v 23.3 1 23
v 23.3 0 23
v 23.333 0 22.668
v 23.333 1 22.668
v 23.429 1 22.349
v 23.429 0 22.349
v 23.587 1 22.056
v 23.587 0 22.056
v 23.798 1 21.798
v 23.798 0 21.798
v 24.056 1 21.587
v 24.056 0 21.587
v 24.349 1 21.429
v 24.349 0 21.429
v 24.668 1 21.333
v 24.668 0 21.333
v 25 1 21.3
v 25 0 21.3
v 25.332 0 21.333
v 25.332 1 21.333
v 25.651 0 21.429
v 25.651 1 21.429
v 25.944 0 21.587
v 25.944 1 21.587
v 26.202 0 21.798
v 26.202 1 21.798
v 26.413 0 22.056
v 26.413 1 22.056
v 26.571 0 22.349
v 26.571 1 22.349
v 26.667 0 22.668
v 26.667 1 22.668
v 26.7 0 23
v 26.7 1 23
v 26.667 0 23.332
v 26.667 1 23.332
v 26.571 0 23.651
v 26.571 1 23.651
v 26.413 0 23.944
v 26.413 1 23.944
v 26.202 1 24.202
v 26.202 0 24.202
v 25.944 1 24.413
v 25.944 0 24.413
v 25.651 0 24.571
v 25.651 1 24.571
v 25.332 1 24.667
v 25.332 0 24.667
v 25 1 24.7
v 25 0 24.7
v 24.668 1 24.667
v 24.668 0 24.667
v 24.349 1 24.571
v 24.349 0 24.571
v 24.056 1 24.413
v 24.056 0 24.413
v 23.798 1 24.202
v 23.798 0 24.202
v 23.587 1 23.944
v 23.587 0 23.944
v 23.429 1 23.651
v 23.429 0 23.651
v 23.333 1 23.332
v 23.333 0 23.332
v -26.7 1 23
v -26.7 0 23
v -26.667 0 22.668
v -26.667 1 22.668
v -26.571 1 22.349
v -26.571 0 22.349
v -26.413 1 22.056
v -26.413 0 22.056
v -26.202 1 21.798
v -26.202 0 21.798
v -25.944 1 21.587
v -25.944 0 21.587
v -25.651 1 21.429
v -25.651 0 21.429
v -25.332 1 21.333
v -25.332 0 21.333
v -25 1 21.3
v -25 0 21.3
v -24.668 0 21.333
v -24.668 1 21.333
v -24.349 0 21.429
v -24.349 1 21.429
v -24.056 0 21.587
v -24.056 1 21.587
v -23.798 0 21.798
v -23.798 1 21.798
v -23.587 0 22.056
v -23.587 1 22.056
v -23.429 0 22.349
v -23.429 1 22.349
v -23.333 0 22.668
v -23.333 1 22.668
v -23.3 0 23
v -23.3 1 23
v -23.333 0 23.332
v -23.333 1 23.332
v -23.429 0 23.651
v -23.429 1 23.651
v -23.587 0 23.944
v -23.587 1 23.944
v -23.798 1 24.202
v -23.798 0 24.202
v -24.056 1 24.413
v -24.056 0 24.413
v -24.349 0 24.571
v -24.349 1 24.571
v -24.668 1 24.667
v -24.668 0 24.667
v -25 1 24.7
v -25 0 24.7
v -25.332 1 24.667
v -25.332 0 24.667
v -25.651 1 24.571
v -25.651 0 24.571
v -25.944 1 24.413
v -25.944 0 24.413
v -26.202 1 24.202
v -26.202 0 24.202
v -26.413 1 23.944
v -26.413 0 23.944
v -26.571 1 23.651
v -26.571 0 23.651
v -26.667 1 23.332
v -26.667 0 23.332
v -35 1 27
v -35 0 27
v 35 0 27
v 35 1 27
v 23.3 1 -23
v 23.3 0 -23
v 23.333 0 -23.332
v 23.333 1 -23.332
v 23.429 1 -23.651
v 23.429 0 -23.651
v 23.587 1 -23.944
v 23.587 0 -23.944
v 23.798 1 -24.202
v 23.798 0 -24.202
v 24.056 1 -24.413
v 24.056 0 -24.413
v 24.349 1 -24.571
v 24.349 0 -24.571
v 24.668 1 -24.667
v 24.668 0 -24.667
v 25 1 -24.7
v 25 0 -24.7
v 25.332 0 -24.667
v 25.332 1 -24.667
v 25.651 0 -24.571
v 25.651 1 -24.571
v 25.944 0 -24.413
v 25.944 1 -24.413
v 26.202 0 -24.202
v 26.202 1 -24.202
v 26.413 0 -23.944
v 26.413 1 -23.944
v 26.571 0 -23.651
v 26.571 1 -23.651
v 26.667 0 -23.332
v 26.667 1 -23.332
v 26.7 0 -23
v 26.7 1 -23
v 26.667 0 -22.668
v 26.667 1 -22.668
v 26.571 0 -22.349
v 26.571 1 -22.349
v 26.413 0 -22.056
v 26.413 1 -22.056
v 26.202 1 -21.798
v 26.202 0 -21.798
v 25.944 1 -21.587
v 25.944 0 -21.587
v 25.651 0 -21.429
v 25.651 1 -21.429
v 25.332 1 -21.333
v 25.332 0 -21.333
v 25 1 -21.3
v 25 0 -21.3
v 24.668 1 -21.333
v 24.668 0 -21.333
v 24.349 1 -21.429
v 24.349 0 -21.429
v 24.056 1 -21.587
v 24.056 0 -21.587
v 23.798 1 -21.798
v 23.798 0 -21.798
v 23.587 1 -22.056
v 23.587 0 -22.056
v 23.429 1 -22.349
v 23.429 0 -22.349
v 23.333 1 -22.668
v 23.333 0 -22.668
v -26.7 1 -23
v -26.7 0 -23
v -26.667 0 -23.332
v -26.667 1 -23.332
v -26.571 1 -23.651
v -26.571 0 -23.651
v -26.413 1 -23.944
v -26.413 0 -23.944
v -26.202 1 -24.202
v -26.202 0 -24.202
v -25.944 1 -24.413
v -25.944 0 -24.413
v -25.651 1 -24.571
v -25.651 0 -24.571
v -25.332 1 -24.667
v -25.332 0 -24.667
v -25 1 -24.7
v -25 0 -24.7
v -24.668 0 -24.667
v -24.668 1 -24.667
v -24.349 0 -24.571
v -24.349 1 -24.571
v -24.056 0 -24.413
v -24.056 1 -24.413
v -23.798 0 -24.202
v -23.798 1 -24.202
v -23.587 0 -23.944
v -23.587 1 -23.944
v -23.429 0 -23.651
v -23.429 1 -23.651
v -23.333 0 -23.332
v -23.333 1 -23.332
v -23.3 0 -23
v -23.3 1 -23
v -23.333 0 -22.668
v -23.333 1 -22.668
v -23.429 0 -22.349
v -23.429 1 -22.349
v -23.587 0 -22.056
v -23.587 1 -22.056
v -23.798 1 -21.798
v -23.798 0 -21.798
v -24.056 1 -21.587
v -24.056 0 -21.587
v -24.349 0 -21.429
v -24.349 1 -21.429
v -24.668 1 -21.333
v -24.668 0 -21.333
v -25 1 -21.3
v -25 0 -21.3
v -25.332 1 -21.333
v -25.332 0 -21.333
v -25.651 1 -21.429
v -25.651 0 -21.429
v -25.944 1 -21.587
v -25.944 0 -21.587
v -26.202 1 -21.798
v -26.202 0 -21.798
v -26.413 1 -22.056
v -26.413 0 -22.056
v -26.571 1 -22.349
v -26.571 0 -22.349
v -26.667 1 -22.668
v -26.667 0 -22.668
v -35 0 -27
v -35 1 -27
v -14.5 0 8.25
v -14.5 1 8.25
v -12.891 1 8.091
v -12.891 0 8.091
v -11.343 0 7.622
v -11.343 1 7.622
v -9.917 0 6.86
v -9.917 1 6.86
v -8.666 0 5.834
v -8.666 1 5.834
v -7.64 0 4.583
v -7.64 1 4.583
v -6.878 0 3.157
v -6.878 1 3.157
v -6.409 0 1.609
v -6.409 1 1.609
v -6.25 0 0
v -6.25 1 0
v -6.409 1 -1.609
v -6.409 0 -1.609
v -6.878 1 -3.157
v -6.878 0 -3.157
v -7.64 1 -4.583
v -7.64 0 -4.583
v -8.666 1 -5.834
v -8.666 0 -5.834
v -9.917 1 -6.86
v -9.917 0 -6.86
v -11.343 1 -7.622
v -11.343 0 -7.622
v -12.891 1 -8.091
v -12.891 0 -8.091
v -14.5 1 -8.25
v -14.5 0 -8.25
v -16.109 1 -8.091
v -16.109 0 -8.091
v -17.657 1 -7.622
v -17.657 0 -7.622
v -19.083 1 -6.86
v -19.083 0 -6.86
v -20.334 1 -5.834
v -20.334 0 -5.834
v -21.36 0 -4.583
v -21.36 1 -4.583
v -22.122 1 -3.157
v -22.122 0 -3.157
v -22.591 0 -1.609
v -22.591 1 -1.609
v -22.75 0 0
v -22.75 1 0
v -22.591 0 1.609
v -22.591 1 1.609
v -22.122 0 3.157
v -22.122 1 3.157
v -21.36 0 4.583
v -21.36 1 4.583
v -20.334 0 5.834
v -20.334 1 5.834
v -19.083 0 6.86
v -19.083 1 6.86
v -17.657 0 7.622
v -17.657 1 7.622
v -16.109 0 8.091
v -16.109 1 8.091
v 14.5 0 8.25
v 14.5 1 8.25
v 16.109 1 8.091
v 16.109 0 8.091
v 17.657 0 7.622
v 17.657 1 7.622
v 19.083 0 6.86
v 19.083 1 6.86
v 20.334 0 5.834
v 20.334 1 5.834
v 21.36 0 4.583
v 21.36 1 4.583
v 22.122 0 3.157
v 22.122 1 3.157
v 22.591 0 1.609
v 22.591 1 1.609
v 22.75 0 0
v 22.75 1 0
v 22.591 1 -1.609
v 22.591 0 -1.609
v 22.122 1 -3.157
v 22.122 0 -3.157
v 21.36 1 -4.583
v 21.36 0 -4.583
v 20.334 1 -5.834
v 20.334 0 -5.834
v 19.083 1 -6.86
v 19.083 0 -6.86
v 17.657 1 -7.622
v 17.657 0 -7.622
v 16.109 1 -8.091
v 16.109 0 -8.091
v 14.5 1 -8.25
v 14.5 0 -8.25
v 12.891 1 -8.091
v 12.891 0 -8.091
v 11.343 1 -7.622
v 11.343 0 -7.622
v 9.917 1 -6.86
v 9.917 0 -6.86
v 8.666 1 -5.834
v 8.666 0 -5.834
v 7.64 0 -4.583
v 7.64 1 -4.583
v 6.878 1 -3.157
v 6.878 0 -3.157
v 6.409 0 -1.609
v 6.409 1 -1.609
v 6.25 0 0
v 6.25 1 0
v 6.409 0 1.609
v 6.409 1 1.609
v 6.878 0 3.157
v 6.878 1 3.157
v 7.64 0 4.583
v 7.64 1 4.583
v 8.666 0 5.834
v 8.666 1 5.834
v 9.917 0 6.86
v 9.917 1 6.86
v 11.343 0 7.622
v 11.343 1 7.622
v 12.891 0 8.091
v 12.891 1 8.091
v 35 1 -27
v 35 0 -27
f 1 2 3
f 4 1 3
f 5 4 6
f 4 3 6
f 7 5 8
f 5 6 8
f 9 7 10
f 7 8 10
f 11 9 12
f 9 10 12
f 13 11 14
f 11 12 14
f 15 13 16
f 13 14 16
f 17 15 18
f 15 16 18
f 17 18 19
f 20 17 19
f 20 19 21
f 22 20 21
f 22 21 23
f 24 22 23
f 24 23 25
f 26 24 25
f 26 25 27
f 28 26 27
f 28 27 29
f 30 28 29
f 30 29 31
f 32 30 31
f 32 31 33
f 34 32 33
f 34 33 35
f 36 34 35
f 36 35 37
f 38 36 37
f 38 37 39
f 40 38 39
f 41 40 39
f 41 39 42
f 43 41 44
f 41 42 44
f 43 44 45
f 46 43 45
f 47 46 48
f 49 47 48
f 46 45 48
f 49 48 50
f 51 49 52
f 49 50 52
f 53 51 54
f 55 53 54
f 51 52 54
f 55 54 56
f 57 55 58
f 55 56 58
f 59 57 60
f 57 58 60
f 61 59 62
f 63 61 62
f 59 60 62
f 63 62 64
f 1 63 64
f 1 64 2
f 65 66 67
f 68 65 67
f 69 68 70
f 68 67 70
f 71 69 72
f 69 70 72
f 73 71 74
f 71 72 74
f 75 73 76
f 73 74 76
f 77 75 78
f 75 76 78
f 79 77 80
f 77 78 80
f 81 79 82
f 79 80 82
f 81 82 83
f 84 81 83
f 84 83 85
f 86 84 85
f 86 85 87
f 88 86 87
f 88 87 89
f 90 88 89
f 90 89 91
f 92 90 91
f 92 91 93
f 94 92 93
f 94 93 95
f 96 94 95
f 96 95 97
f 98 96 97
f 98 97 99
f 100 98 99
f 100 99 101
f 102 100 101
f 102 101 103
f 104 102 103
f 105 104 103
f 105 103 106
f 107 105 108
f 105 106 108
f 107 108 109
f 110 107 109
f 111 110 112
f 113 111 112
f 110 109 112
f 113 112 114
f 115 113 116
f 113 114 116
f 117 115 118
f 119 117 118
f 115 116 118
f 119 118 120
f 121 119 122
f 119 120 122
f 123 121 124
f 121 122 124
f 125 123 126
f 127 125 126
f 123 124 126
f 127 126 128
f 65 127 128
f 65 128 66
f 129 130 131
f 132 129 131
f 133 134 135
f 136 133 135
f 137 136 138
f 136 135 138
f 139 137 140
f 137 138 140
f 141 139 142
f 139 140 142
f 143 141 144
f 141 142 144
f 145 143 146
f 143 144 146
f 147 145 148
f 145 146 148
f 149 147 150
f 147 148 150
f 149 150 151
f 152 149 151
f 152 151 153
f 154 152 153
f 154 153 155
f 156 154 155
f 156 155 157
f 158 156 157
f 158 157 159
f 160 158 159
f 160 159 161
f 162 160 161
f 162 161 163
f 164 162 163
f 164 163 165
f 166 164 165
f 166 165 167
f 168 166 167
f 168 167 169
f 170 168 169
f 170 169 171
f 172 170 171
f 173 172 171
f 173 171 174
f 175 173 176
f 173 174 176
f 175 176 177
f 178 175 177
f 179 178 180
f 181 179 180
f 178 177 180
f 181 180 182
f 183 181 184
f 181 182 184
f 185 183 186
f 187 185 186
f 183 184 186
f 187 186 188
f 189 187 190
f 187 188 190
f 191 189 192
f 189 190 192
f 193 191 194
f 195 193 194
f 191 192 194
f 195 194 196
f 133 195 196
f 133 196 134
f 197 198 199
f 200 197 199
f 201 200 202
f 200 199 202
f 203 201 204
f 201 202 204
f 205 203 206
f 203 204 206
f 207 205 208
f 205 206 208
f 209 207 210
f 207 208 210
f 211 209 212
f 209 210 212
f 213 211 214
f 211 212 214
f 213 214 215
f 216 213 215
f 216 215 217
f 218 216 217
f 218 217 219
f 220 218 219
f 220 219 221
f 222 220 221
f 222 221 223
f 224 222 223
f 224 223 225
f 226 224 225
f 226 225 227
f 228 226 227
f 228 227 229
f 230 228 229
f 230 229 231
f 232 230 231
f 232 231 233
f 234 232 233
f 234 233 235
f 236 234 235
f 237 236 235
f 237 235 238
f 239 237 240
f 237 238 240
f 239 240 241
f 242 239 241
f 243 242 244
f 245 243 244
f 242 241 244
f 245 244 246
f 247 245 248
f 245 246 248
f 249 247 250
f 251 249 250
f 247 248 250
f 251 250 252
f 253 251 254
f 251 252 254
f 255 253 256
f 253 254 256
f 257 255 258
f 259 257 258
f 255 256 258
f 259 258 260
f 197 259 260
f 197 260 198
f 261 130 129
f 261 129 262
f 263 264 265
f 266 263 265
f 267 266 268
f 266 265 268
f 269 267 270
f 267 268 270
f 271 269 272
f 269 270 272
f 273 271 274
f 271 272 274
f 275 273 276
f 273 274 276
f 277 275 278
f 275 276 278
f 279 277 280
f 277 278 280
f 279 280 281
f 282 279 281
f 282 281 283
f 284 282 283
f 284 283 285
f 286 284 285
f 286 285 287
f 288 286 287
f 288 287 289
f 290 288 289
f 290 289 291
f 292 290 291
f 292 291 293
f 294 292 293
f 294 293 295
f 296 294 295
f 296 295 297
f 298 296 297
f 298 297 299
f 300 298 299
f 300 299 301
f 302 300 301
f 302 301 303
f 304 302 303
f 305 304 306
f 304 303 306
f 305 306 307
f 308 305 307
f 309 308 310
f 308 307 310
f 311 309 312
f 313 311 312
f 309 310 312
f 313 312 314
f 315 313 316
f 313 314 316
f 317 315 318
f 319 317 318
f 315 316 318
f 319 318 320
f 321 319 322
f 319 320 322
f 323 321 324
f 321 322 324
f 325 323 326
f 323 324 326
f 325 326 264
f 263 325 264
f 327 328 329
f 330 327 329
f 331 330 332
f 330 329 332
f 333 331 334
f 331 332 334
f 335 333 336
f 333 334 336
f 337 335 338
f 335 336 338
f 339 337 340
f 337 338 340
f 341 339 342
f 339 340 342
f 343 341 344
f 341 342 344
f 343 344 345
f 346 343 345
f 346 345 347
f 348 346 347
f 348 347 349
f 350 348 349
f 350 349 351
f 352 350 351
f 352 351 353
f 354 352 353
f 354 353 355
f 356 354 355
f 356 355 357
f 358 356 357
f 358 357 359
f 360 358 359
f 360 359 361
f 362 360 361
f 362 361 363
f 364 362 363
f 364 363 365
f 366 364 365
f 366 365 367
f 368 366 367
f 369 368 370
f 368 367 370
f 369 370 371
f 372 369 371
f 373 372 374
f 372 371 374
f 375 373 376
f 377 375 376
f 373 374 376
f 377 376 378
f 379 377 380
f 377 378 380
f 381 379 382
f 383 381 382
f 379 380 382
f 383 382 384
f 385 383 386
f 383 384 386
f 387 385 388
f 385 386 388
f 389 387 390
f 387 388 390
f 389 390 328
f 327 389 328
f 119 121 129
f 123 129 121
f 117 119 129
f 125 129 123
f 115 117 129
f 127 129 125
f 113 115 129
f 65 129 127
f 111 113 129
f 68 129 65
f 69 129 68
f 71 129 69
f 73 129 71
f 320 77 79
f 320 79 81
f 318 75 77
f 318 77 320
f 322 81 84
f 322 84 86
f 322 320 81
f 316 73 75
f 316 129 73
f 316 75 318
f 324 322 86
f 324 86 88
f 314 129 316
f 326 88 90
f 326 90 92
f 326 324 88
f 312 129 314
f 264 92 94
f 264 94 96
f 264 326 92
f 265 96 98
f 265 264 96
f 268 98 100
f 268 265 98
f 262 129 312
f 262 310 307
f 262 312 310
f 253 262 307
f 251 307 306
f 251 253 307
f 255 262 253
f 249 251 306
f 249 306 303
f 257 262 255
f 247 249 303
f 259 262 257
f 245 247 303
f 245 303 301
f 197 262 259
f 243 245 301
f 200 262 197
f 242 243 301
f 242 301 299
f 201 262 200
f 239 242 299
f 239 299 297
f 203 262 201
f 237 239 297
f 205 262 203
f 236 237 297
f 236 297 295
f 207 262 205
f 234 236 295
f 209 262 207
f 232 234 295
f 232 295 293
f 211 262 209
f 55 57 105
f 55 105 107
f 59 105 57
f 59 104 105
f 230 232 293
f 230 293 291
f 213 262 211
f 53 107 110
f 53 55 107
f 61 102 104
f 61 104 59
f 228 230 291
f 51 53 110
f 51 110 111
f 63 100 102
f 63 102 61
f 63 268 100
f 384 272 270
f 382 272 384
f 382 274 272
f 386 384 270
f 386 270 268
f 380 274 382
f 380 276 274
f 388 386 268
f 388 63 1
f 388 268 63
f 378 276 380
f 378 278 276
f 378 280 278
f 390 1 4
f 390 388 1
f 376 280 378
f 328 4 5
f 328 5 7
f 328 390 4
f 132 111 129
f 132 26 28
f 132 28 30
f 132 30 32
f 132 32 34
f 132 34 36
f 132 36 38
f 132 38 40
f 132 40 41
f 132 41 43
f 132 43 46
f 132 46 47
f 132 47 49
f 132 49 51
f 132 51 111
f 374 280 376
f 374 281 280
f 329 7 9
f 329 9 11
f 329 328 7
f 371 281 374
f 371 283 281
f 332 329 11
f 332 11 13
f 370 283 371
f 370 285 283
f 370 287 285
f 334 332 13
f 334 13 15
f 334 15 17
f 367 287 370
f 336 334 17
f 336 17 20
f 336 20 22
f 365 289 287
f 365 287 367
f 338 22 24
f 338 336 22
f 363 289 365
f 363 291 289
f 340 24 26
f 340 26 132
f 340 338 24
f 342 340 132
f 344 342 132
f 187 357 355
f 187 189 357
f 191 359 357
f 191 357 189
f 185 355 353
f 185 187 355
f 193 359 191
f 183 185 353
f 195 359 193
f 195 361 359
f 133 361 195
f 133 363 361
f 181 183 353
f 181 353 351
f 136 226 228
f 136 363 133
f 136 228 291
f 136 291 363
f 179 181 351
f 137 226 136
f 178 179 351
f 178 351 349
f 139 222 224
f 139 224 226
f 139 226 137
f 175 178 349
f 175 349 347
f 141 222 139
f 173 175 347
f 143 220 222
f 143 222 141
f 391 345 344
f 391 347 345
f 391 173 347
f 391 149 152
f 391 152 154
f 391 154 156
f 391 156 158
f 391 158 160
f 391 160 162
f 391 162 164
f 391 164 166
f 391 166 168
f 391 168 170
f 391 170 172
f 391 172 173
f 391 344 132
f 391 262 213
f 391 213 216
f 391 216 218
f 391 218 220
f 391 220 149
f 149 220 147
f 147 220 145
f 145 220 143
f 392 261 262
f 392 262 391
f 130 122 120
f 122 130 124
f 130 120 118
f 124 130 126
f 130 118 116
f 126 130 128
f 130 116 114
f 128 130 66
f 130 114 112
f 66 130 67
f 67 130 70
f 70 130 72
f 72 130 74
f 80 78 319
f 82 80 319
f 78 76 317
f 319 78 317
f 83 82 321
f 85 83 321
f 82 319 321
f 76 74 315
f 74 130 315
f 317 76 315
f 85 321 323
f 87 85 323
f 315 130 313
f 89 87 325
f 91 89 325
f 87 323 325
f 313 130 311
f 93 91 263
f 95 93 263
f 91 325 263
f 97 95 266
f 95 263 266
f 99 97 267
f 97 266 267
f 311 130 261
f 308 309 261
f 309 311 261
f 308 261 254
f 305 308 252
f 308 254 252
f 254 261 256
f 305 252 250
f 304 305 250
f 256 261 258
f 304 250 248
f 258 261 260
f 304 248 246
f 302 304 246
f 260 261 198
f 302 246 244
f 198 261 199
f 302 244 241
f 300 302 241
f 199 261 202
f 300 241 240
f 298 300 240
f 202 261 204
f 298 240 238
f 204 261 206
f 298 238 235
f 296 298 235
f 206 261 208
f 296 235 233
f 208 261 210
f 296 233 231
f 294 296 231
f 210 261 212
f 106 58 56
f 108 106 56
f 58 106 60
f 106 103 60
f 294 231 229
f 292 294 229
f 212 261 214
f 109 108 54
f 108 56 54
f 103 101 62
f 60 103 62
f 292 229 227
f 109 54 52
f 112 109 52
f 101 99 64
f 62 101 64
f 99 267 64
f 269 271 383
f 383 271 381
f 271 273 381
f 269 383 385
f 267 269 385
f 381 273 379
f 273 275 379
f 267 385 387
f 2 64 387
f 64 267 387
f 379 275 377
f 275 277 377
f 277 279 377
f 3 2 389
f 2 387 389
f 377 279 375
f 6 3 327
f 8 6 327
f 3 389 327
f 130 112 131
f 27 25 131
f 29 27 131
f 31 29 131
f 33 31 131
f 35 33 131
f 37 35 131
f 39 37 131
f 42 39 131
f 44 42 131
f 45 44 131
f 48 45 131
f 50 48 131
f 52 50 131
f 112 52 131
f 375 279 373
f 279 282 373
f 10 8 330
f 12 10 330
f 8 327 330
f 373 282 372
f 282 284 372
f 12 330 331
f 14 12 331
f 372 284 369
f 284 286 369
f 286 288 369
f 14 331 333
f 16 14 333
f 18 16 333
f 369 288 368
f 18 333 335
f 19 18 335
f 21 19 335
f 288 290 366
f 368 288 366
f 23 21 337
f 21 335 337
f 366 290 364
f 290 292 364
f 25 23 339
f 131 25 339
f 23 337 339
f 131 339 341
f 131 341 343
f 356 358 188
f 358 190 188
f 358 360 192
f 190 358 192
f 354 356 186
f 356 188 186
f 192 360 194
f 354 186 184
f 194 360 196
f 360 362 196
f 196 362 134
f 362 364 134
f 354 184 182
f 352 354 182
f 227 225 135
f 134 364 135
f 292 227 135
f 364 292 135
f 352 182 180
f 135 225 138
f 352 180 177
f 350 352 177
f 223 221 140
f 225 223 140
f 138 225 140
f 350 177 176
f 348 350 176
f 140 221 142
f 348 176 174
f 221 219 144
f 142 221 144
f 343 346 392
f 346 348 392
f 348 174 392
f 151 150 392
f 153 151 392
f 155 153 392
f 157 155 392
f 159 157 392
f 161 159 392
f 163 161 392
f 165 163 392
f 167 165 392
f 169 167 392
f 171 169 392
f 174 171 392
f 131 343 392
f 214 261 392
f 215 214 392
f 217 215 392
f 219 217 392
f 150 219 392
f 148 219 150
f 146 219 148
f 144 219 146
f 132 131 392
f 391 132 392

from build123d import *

# Parameters (mm, degrees)
ESQUISSE1_W             = 70
ESQUISSE1_H             = 54
BOSS_EXTRU_1_DEPTH      = 1
ESQUISSE2_R             = 8.25
ENL_V_MAT_EXTRU_1_DEPTH = 10
ESQUISSE4_R             = 8.25
ENL_V_MAT_EXTRU_3_DEPTH = 10
M3_CLEARANCE_HOLE1_D    = 3.4


with BuildPart() as part:
    # Esquisse1 → Boss.-Extru.1 (new body)
    with BuildSketch(Plane(origin=(0, 0, 0), x_dir=(1, 0, 0), z_dir=(0, 1, 0))):
        Rectangle(ESQUISSE1_W, ESQUISSE1_H)
    extrude(amount=BOSS_EXTRU_1_DEPTH)

    # Esquisse2 → Enlèv. mat.-Extru.1 (cut)
    with BuildSketch(Plane(origin=(0, 1, 0), x_dir=(1, 0, 0), z_dir=(0, 1, 0))):
        with Locations(Location((-14.5, 0, 0), (0, 0, 270))):
            Circle(ESQUISSE2_R)
    extrude(amount=-ENL_V_MAT_EXTRU_1_DEPTH, mode=Mode.SUBTRACT)

    # Esquisse4 → Enlèv. mat.-Extru.3 (cut)
    with BuildSketch(Plane(origin=(0, 1, 0), x_dir=(1, 0, 0), z_dir=(0, 1, 0))):
        with Locations(Location((14.5, 0, 0), (0, 0, 270))):
            Circle(ESQUISSE4_R)
    extrude(amount=-ENL_V_MAT_EXTRU_3_DEPTH, mode=Mode.SUBTRACT)

    # M3 Clearance Hole1 (through all)
    with Locations(Plane(origin=(0, 1, 0), x_dir=(1, 0, 0), z_dir=(0, 1, 0))):
        with Locations((-25, -23), (25, -23), (25, 23), (-25, 23)):
            Hole(M3_CLEARANCE_HOLE1_D / 2)


solid = part.part
